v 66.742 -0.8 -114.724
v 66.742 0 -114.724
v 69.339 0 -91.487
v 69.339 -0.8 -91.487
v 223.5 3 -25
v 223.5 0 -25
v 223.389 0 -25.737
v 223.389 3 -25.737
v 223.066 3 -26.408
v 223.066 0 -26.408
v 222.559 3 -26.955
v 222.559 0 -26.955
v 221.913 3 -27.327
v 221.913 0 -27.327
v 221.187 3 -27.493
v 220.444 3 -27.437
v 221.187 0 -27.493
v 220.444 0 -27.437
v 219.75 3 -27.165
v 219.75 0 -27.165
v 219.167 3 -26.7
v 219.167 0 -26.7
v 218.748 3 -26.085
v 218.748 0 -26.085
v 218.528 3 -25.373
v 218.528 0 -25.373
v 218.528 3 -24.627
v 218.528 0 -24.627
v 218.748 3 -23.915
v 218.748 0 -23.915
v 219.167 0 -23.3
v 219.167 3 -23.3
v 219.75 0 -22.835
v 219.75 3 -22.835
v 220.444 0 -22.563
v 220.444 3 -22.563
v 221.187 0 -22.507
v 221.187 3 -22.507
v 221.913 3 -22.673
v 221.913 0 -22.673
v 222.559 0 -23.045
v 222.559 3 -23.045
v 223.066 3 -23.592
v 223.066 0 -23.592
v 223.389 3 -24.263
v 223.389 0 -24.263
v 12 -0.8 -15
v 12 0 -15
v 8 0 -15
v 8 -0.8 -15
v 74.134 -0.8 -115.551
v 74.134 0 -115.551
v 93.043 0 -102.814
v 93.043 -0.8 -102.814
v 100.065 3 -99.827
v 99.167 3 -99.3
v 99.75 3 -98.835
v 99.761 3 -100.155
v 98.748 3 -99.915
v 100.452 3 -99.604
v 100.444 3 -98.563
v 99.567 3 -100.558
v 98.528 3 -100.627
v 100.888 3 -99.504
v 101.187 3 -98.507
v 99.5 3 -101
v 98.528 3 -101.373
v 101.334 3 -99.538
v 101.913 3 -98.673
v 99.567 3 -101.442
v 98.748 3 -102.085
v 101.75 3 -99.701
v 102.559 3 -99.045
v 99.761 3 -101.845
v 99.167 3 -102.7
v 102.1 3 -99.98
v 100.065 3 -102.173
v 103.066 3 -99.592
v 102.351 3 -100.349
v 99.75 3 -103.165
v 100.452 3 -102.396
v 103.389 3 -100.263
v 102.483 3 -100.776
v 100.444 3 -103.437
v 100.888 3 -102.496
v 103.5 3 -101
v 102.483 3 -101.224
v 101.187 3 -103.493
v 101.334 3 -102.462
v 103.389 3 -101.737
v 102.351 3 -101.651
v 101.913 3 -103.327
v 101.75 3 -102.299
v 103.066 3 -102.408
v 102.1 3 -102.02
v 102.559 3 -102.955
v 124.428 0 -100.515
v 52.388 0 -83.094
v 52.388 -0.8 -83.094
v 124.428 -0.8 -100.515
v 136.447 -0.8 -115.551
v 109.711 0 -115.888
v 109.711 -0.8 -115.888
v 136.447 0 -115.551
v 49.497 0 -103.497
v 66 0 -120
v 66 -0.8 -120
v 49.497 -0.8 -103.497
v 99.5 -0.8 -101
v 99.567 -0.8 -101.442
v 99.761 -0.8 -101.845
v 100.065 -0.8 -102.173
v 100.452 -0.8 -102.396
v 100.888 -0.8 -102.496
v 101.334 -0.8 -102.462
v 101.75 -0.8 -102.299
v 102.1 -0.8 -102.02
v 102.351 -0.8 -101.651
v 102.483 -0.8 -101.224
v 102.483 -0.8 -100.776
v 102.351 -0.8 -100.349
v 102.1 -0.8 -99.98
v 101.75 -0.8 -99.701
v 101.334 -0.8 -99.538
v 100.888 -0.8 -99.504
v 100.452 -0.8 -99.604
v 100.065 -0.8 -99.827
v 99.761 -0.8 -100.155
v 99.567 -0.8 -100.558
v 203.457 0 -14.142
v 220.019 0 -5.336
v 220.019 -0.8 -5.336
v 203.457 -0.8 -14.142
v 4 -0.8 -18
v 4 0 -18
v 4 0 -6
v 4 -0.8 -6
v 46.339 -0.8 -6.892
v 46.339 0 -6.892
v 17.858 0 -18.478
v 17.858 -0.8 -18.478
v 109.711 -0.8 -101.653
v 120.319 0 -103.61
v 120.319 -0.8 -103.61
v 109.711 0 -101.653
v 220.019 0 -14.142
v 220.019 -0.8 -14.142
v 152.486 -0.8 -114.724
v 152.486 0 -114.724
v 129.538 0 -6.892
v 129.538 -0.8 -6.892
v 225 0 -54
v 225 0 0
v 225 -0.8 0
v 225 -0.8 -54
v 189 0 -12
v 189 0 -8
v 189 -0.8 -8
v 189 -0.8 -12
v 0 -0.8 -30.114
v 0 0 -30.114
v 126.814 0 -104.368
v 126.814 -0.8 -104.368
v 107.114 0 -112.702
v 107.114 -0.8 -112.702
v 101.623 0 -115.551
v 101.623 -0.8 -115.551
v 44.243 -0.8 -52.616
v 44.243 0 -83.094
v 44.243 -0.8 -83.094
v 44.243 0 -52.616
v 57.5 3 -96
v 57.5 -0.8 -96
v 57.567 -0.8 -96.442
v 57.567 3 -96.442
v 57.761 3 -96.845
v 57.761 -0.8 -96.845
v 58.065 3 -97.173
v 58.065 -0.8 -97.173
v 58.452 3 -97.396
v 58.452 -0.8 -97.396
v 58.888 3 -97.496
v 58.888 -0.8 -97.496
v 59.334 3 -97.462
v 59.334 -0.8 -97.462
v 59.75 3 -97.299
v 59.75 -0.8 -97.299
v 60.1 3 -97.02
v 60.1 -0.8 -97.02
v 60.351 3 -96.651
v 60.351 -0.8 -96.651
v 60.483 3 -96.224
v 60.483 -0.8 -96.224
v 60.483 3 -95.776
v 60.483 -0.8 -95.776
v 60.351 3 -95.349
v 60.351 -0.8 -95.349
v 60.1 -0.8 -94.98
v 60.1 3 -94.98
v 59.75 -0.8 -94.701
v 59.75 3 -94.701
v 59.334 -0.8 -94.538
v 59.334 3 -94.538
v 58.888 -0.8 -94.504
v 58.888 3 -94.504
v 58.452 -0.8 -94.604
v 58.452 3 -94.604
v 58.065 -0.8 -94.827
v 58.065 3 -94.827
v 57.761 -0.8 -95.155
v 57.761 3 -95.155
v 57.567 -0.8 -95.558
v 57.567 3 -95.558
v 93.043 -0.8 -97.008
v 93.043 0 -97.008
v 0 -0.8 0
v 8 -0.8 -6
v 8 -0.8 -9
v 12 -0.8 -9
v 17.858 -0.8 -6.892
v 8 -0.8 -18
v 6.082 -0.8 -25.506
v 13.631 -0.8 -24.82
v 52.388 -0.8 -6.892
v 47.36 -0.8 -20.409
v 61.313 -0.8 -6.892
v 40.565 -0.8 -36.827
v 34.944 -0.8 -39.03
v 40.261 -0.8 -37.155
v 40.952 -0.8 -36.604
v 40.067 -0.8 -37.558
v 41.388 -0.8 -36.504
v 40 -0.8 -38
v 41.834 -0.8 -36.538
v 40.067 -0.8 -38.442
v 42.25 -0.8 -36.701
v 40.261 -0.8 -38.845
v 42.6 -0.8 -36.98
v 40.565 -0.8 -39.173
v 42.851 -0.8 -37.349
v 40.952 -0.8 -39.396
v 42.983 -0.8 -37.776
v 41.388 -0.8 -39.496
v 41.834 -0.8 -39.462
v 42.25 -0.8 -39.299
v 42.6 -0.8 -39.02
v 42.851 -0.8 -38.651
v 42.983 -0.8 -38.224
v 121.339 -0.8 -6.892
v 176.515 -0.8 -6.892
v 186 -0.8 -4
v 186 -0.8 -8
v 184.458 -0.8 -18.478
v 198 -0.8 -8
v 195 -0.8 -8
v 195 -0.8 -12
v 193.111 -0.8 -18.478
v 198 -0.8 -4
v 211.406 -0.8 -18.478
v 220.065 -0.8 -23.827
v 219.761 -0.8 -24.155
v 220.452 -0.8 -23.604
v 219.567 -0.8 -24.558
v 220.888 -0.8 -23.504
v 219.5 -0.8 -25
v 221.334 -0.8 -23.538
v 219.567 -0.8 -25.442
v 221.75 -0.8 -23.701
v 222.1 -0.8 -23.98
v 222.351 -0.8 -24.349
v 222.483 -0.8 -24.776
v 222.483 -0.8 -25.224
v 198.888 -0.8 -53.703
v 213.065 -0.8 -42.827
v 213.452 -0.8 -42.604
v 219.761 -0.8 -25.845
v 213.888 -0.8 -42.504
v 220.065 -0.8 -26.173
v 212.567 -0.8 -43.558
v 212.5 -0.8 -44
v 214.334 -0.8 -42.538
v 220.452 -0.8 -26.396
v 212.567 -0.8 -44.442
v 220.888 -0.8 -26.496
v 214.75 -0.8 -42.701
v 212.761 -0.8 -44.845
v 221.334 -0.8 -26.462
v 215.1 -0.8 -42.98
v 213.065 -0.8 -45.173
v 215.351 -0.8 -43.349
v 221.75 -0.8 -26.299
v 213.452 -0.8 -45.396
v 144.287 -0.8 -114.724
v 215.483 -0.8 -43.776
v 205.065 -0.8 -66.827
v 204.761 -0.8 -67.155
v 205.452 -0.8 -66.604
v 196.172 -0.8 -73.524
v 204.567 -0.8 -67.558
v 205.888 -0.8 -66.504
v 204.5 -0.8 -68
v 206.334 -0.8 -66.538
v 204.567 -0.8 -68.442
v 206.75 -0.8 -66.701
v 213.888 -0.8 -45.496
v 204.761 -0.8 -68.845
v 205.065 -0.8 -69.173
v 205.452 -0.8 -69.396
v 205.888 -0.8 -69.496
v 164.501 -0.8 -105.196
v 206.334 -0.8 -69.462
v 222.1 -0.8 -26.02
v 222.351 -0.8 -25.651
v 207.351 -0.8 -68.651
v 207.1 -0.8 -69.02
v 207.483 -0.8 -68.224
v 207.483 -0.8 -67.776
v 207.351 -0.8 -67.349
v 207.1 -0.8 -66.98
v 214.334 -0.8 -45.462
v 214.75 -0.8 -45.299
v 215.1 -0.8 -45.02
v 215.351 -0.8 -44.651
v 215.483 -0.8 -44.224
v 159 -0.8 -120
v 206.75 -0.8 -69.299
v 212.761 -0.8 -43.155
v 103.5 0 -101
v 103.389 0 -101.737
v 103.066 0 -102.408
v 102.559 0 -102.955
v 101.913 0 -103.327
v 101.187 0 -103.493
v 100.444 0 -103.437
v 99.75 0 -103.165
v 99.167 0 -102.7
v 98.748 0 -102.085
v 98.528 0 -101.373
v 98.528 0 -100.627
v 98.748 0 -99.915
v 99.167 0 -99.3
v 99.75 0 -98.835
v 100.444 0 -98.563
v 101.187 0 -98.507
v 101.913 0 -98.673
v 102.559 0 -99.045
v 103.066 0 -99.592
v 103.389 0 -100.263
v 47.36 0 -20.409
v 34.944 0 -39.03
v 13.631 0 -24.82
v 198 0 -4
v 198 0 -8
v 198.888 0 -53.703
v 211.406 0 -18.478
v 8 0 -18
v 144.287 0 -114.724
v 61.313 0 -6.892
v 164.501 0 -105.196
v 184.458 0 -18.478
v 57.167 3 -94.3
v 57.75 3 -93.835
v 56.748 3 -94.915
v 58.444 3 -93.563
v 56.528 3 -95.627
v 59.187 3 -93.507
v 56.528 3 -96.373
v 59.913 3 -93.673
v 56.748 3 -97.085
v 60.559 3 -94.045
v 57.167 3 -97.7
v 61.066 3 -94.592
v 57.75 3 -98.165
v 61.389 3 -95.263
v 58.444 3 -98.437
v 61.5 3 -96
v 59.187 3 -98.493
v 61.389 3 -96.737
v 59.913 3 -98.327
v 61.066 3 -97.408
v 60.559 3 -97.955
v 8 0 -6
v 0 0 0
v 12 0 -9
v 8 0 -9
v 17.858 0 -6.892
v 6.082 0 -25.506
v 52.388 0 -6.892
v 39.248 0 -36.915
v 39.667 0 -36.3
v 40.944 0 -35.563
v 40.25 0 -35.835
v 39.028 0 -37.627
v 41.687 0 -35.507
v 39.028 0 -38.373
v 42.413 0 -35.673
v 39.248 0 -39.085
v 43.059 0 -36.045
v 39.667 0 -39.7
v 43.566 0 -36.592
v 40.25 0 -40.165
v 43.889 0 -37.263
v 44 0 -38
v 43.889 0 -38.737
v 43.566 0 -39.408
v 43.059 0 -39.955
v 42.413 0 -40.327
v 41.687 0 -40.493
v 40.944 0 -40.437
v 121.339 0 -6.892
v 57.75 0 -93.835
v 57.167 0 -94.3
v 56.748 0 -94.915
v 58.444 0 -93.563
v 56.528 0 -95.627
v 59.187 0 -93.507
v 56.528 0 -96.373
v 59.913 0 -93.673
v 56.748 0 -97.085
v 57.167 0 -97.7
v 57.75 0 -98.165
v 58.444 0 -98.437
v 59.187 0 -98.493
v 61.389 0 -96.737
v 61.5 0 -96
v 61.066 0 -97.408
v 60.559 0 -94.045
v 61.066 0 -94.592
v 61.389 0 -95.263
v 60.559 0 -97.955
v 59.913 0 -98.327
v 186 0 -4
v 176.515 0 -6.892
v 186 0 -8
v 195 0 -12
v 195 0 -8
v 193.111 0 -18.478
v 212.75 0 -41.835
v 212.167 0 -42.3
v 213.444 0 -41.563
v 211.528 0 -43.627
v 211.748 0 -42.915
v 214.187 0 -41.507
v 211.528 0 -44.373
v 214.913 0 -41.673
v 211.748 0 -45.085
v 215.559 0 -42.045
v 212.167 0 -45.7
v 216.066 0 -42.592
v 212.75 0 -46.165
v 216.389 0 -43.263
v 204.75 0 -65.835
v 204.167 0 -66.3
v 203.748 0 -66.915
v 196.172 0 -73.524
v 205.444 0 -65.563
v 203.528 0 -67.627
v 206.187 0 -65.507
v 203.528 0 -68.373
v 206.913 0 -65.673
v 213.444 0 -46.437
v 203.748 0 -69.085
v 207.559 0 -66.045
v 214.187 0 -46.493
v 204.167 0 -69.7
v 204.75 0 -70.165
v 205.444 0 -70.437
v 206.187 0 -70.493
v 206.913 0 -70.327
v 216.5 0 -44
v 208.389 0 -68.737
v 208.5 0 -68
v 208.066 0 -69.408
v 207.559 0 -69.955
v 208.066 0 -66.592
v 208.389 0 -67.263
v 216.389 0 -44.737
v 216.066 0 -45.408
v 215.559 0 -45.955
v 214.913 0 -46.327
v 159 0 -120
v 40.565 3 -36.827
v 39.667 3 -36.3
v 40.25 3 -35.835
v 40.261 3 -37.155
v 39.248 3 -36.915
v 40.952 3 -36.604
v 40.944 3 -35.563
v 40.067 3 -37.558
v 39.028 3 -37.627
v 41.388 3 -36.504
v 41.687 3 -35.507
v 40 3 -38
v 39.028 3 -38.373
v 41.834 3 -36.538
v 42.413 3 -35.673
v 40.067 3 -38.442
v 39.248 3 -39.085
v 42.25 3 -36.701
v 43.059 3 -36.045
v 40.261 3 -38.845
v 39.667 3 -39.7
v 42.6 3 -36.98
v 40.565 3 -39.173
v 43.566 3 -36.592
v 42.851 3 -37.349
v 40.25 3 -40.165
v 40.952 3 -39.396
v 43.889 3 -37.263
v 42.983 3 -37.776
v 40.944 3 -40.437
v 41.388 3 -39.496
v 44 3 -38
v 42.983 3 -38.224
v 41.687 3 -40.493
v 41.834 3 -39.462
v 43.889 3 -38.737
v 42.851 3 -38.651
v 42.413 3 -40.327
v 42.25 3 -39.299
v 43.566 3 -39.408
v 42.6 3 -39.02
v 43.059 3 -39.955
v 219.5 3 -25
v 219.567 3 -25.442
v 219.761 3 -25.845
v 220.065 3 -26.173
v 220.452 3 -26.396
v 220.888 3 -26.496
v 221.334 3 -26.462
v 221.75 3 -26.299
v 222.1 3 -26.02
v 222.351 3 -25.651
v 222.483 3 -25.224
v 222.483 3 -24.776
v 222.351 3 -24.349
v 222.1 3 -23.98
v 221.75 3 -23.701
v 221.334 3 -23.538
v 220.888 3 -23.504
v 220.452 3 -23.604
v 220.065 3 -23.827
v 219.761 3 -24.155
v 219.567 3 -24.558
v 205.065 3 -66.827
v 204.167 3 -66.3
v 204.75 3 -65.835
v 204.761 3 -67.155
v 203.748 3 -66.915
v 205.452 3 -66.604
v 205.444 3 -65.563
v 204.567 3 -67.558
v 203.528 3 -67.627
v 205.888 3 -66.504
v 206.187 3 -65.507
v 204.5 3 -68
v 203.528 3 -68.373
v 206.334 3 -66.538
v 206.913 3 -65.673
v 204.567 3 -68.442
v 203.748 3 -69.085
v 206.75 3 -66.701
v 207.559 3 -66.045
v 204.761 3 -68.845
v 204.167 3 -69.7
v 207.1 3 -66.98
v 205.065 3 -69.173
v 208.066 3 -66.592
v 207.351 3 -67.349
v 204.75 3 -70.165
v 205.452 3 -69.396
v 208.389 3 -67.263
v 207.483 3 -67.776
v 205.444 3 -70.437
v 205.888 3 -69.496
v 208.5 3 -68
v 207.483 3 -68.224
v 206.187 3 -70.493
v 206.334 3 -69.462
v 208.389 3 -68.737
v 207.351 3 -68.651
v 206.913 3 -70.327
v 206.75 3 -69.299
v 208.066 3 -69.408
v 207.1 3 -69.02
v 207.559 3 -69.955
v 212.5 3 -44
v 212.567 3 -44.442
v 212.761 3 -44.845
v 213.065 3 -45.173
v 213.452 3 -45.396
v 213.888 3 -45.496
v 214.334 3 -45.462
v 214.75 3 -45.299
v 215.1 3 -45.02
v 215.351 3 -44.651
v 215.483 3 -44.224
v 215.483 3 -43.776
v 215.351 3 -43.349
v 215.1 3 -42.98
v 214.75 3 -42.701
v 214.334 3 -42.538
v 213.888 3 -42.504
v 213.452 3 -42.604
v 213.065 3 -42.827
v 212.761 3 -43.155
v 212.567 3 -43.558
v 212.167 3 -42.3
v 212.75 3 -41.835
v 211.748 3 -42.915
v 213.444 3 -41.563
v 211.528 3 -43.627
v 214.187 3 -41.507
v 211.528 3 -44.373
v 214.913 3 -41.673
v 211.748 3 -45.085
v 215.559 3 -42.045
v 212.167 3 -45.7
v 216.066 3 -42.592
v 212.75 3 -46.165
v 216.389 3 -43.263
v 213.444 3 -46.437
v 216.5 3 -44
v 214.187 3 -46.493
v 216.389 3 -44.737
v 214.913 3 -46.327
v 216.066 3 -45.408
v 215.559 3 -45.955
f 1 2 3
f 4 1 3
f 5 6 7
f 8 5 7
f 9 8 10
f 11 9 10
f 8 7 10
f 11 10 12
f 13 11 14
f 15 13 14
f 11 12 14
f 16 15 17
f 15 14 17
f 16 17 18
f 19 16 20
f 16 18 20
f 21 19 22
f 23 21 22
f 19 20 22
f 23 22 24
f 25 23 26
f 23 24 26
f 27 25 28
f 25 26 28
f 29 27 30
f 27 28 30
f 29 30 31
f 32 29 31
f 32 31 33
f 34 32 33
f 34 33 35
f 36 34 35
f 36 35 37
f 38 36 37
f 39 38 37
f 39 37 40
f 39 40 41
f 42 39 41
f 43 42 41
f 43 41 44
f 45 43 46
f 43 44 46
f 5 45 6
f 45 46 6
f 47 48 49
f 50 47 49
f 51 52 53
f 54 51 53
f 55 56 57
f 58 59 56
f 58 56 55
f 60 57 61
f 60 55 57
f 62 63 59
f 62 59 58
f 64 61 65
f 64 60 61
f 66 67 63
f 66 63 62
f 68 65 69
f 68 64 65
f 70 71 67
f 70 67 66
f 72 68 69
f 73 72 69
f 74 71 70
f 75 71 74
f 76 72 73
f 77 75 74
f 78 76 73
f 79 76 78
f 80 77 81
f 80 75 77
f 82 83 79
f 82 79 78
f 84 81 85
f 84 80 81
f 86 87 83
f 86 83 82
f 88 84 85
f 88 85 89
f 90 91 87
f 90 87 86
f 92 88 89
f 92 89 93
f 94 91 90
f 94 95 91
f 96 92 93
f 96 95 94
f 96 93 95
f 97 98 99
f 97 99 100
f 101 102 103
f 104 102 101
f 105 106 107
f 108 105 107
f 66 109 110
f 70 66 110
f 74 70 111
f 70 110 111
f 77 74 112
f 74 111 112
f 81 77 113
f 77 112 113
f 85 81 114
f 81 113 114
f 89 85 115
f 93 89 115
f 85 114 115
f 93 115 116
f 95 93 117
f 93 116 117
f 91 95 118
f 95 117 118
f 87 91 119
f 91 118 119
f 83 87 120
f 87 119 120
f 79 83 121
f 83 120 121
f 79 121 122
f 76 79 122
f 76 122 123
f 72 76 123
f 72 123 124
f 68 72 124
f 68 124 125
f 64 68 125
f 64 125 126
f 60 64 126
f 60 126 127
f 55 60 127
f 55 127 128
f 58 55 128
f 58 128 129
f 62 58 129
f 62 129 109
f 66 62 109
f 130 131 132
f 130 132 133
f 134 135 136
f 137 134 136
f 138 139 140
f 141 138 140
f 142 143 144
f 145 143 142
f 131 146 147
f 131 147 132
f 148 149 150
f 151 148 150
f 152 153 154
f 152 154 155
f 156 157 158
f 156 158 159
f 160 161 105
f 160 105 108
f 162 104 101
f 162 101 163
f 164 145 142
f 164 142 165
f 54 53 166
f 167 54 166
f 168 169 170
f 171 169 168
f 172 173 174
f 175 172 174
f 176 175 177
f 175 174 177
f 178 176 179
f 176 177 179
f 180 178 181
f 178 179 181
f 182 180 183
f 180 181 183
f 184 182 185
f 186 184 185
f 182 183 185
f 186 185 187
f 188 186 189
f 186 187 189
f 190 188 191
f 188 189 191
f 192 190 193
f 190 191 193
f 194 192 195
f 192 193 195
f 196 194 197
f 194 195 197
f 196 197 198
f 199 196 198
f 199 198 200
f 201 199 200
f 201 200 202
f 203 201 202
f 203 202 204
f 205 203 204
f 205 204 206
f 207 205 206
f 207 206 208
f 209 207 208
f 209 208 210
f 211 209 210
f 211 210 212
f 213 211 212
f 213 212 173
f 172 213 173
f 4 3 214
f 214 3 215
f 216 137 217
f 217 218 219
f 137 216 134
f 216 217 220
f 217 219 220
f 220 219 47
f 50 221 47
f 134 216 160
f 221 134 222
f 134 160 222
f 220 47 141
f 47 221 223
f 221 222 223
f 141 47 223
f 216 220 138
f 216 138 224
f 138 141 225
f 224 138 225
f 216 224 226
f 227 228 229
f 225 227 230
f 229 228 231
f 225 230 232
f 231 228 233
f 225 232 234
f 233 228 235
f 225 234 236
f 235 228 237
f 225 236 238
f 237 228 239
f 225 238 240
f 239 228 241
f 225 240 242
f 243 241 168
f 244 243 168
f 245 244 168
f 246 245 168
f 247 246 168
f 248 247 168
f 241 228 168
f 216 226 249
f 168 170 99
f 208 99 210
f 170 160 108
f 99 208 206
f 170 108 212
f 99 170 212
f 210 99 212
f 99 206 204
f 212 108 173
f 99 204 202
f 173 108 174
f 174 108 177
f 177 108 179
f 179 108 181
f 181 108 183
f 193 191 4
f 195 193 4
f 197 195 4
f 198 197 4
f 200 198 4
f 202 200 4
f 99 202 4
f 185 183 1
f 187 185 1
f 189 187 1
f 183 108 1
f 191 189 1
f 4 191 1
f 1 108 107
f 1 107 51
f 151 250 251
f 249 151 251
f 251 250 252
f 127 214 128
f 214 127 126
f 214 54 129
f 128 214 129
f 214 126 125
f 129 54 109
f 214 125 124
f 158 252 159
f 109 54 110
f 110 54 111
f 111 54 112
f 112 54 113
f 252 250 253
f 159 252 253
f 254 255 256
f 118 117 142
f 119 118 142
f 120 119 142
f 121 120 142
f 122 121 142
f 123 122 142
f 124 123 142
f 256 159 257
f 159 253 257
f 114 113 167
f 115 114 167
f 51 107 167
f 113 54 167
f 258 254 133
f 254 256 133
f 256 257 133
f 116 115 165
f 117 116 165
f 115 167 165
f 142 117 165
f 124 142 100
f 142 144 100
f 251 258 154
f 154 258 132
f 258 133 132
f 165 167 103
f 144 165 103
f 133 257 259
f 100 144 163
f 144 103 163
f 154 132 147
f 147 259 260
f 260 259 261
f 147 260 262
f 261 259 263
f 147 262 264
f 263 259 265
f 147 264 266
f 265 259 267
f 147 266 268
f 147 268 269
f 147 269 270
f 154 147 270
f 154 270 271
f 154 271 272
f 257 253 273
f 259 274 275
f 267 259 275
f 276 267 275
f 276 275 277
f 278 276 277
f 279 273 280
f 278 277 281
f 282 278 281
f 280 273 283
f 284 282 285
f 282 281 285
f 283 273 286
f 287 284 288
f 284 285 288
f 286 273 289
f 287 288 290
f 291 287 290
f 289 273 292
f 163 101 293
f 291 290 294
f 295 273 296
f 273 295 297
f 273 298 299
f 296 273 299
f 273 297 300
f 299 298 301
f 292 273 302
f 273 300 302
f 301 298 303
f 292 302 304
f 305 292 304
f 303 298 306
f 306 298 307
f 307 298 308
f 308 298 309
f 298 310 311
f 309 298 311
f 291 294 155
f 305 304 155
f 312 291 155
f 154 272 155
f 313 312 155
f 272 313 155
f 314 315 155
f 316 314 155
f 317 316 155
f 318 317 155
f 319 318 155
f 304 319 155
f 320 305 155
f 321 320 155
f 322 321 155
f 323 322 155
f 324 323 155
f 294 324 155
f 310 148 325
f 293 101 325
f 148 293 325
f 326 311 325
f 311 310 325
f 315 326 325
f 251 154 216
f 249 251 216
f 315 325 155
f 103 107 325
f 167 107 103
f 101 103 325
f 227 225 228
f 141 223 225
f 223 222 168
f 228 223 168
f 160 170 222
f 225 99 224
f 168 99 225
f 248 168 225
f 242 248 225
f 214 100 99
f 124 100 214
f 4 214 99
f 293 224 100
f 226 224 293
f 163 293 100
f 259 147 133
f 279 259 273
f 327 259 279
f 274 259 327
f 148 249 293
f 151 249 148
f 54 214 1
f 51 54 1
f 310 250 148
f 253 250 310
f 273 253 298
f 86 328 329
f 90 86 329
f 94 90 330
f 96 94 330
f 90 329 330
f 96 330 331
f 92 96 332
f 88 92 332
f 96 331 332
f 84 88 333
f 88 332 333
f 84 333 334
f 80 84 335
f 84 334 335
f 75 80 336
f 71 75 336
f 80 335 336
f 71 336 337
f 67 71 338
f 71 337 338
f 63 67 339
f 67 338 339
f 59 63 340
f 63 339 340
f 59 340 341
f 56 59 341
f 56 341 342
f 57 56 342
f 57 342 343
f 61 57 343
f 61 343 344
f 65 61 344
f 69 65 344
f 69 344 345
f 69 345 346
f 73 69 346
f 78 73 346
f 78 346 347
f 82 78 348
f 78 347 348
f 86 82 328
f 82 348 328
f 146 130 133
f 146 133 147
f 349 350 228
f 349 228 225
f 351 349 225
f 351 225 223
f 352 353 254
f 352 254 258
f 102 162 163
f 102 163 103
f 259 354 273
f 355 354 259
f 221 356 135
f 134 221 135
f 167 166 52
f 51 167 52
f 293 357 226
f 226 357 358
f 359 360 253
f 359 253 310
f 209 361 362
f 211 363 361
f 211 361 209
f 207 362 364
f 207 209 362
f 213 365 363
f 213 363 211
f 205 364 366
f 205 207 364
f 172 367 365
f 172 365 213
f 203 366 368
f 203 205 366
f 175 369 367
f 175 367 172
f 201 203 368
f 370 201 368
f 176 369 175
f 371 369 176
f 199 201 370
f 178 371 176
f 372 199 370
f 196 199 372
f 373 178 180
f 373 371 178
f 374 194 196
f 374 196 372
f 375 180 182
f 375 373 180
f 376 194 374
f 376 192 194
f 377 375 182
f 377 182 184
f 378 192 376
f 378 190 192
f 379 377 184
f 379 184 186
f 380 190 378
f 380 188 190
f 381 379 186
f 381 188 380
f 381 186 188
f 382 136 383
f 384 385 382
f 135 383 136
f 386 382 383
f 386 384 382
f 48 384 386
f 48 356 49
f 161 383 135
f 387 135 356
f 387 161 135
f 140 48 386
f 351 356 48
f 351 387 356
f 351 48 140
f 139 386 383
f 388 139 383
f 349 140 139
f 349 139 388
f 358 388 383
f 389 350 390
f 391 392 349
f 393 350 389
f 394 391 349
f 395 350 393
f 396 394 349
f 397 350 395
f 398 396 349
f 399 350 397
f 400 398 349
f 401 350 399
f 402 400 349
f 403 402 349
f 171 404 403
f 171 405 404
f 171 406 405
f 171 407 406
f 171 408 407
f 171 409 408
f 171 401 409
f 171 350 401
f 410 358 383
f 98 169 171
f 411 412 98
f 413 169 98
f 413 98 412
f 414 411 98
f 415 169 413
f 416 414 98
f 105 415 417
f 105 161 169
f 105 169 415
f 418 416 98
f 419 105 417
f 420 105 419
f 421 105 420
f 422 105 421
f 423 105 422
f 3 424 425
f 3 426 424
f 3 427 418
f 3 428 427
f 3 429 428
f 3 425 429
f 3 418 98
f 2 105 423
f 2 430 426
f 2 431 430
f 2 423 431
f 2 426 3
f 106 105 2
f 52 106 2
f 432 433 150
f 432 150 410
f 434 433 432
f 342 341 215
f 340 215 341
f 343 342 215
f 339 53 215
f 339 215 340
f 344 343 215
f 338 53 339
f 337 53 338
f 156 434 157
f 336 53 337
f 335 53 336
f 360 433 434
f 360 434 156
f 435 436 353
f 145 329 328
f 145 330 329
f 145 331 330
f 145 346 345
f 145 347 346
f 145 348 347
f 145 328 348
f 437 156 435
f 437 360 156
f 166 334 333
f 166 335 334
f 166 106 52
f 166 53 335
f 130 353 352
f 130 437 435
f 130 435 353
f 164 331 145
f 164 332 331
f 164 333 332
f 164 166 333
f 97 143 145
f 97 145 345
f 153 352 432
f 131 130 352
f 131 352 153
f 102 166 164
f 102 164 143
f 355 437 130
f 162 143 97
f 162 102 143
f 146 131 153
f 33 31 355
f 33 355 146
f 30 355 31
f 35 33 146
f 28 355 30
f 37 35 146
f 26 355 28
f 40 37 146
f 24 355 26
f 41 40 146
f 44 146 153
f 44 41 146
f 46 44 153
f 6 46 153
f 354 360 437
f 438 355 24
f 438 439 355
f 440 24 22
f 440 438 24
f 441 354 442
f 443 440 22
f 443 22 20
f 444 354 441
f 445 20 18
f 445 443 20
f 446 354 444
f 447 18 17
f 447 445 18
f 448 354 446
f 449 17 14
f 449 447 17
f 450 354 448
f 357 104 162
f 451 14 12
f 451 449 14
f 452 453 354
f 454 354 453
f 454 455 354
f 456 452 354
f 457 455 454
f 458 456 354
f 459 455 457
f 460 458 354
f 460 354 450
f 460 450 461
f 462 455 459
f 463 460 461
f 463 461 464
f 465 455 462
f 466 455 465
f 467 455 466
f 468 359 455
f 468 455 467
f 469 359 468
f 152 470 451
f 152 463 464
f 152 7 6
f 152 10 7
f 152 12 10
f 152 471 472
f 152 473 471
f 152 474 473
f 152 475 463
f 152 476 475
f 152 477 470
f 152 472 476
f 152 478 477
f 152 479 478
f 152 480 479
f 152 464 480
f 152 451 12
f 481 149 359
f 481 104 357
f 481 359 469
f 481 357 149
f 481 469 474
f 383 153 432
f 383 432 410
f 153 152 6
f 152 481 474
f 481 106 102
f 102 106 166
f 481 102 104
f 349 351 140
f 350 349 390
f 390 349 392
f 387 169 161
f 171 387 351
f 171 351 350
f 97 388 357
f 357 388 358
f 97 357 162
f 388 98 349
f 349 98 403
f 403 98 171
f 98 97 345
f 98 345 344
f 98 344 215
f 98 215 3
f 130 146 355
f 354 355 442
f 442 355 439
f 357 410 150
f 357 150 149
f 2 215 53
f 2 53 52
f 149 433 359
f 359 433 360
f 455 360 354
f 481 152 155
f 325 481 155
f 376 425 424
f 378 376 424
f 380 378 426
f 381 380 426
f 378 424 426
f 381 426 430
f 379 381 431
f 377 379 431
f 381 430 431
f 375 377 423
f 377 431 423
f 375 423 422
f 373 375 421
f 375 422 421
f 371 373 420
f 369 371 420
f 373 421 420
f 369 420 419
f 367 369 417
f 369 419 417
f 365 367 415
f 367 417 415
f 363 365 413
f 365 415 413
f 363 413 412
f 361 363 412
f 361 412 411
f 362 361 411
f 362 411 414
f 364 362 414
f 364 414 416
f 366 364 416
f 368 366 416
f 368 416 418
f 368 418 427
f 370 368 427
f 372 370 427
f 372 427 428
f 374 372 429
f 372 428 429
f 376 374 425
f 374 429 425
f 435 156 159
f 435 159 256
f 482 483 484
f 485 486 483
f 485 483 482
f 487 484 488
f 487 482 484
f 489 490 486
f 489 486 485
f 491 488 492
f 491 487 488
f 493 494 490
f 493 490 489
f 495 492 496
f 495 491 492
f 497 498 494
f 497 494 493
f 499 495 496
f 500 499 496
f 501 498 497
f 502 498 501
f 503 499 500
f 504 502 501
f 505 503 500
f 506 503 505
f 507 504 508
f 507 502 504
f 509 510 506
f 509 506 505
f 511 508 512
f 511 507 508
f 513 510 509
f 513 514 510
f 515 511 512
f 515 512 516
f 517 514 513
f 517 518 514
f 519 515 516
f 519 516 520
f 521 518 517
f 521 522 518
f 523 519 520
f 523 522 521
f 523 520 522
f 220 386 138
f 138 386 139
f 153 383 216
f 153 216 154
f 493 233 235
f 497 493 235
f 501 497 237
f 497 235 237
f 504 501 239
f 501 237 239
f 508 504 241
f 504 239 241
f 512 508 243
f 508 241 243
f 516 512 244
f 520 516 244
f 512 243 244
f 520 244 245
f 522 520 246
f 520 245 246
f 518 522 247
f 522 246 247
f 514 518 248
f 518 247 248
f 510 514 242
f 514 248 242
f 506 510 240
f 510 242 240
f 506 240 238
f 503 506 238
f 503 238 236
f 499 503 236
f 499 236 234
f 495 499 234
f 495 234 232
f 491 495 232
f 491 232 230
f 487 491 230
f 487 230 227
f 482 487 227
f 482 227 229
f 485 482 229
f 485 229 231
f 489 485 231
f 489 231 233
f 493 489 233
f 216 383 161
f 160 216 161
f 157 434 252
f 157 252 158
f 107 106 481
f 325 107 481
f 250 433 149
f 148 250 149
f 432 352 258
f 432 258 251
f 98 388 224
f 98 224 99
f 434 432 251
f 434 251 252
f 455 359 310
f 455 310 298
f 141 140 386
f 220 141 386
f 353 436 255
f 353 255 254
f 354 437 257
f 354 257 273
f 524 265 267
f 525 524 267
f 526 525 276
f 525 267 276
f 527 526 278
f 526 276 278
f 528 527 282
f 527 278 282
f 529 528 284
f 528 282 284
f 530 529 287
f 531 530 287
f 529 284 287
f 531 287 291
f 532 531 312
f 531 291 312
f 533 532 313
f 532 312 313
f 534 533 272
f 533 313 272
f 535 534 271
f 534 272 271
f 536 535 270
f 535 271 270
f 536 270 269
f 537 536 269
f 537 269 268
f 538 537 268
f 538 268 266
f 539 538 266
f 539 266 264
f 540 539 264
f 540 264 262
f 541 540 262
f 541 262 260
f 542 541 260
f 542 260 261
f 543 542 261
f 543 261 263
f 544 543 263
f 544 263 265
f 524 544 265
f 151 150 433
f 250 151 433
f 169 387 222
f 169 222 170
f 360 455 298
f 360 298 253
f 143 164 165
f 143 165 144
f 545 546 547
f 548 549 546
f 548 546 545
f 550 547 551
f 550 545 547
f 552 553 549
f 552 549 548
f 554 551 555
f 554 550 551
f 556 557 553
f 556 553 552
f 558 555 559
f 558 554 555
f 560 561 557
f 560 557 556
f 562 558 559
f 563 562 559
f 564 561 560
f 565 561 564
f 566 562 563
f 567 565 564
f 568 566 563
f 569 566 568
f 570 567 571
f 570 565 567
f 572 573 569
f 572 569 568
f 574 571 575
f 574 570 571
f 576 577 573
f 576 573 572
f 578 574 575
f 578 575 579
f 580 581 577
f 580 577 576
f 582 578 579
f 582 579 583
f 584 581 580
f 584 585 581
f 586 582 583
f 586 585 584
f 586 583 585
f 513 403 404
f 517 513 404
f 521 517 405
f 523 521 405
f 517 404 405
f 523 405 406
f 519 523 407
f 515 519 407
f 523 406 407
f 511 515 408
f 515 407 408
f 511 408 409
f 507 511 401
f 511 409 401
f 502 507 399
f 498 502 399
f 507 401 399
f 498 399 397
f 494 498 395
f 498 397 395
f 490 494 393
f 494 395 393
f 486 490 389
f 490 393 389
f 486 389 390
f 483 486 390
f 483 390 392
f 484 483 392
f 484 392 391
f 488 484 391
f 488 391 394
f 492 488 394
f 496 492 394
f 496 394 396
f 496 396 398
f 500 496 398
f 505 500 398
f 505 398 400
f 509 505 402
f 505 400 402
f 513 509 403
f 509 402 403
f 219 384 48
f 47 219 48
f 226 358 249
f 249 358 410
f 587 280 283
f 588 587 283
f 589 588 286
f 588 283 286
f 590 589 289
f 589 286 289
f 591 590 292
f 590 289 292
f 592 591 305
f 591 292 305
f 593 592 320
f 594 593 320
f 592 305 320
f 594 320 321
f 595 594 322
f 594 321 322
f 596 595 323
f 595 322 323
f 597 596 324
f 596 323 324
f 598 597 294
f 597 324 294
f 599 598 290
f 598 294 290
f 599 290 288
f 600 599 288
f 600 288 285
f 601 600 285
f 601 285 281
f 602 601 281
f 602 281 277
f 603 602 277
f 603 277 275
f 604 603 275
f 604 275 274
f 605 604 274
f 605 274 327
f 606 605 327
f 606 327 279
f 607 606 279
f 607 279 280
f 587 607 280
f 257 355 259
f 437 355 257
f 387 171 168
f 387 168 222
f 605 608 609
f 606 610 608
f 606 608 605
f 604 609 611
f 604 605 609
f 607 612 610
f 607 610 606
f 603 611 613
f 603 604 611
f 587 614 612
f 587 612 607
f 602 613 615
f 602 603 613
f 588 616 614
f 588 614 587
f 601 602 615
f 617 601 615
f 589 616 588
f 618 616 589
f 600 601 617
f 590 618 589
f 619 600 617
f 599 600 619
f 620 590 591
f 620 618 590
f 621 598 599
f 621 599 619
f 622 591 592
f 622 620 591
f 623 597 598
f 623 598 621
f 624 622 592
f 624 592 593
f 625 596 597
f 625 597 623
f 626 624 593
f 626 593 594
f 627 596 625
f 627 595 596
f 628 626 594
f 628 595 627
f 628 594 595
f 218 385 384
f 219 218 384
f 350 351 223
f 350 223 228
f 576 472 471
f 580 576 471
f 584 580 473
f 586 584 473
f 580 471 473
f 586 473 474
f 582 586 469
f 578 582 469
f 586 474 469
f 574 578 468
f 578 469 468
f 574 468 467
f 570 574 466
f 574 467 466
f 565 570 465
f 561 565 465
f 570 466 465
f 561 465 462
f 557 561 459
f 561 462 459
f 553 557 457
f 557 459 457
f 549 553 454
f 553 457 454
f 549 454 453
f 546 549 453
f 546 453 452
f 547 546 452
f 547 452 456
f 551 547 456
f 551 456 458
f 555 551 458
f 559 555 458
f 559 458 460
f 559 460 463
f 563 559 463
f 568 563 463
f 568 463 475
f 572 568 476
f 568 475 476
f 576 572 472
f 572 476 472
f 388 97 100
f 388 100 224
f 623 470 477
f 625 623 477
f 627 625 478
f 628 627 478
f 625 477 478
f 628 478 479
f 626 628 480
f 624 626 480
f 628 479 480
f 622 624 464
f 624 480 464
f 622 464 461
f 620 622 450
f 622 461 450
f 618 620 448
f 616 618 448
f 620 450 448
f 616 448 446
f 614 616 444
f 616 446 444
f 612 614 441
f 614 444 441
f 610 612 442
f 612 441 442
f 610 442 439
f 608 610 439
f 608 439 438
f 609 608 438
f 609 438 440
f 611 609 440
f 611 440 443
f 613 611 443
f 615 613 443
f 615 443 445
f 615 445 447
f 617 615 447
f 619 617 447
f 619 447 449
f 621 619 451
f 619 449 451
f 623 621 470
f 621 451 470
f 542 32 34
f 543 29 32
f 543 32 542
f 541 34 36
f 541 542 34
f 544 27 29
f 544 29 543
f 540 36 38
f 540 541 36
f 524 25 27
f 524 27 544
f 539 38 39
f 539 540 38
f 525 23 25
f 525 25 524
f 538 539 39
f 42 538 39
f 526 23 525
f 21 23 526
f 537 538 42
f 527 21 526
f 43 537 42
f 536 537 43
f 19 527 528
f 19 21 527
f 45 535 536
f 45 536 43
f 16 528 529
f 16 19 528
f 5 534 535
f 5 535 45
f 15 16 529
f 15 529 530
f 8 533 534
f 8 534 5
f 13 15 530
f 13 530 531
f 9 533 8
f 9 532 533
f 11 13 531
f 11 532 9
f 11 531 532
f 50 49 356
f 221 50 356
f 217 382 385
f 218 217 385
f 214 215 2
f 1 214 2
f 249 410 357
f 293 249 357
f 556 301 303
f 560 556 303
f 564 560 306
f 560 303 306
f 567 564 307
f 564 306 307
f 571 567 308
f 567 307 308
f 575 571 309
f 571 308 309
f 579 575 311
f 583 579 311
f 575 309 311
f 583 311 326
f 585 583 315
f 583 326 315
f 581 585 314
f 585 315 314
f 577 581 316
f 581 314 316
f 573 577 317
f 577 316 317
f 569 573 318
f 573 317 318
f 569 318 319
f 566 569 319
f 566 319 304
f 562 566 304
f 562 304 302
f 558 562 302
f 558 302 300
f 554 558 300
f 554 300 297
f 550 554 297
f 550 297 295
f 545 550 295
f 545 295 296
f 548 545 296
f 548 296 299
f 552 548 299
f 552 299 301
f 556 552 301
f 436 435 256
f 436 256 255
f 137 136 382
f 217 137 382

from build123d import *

# Parameters (mm, degrees)
SKETCH2_R                 = 2.5
BOSS_EXTRUDE1_DEPTH       = 3
BOSS_EXTRUDE1_2_DEPTH     = 3
BOSS_EXTRUDE1_3_DEPTH     = 3
BOSS_EXTRUDE1_4_DEPTH     = 3
BOSS_EXTRUDE1_5_DEPTH     = 3
BOSS_EXTRUDE1_6_DEPTH     = 3
SKETCH4_W                 = 225
SKETCH4_H                 = 120
BOSS_EXTRUDE2_DEPTH       = 0.8
F_3_0MM_DOWEL_HOLE1_D     = 3
F_3_0MM_DOWEL_HOLE1_DEPTH = 4
CUT_EXTRUDE1_REACH        = 2.8
CHAMFER1_SIZE             = 66
CUT_EXTRUDE2_REACH        = 2.8
CHAMFER3_SIZE             = 70
CHAMFER3_SIZE2            = 23.885549322


with BuildPart() as part:
    # Sketch2 → Boss-Extrude1 (new body)
    with BuildSketch(Plane(origin=(0, 0, 0), x_dir=(1, 0, 0), z_dir=(0, 1, 0))):
        with Locations((101, 101)):
            Circle(SKETCH2_R)
    extrude(amount=BOSS_EXTRUDE1_DEPTH)



with BuildPart() as body_2:
    # Sketch2 → Boss-Extrude1 2 (new body)
    with BuildSketch(Plane(origin=(0, 0, 0), x_dir=(1, 0, 0), z_dir=(0, 1, 0))):
        with Locations((206, 68)):
            Circle(SKETCH2_R)
    extrude(amount=BOSS_EXTRUDE1_2_DEPTH)


with BuildPart() as body_3:
    # Sketch2 → Boss-Extrude1 3 (new body)
    with BuildSketch(Plane(origin=(0, 0, 0), x_dir=(1, 0, 0), z_dir=(0, 1, 0))):
        with Locations((214, 44)):
            Circle(SKETCH2_R)
    extrude(amount=BOSS_EXTRUDE1_3_DEPTH)


with BuildPart() as body_4:
    # Sketch2 → Boss-Extrude1 4 (new body)
    with BuildSketch(Plane(origin=(0, 0, 0), x_dir=(1, 0, 0), z_dir=(0, 1, 0))):
        with Locations((221, 25)):
            Circle(SKETCH2_R)
    extrude(amount=BOSS_EXTRUDE1_4_DEPTH)


with BuildPart() as body_5:
    # Sketch2 → Boss-Extrude1 5 (new body)
    with BuildSketch(Plane(origin=(0, 0, 0), x_dir=(1, 0, 0), z_dir=(0, 1, 0))):
        with Locations((41.5, 38)):
            Circle(SKETCH2_R)
    extrude(amount=BOSS_EXTRUDE1_5_DEPTH)


with BuildPart() as body_6:
    # Sketch2 → Boss-Extrude1 6 (new body)
    with BuildSketch(Plane(origin=(0, 0, 0), x_dir=(1, 0, 0), z_dir=(0, 1, 0))):
        with Locations((59, 96)):
            Circle(SKETCH2_R)
    extrude(amount=BOSS_EXTRUDE1_6_DEPTH)


with BuildPart() as part_1:
    add(part.part)

    add(body_2.part)  # Boss-Extrude2 merges body 2

    add(body_3.part)  # Boss-Extrude2 merges body 3

    add(body_4.part)  # Boss-Extrude2 merges body 4

    add(body_5.part)  # Boss-Extrude2 merges body 5

    add(body_6.part)  # Boss-Extrude2 merges body 6
    # Sketch4 → Boss-Extrude2 (add)
    with BuildSketch(Plane(origin=(0, 0, 0), x_dir=(1, 0, 0), z_dir=(0, 1, 0))):
        with Locations((112.5, 60)):
            Rectangle(SKETCH4_W, SKETCH4_H)
    extrude(amount=-BOSS_EXTRUDE2_DEPTH)

    # Ø3.0mm Dowel Hole1
    with Locations(Plane(origin=(0, 3, 0), x_dir=(1, 0, 0), z_dir=(0, 1, 0))):
        with Locations((59, 96), (101, 101), (206, 68), (214, 44), (221, 25), (41.5, 38)):
            Hole(F_3_0MM_DOWEL_HOLE1_D / 2, depth=F_3_0MM_DOWEL_HOLE1_DEPTH)

    # Sketch27 → Cut-Extrude1 (cut, up to next)
    with BuildSketch(Plane(origin=(0, 0, 0), x_dir=(1, 0, 0), z_dir=(0, 1, 0)), mode=Mode.PRIVATE) as cut_extrude1_sk1:
        Polygon((186, 8), (189, 8), (189, 12), (195, 12), (195, 8), (198, 8), (198, 4), (186, 4), align=None)
    cut_extrude1_tool1 = extrude(cut_extrude1_sk1.sketch, amount=-CUT_EXTRUDE1_REACH, mode=Mode.PRIVATE) & part_1.part
    add(cut_extrude1_tool1.solids().sort_by_distance((192, 0, -7.333333))[0], mode=Mode.SUBTRACT)
    # Sketch27 → Cut-Extrude1 (cut, up to next)
    with BuildSketch(Plane(origin=(0, 0, 0), x_dir=(1, 0, 0), z_dir=(0, 1, 0)), mode=Mode.PRIVATE) as cut_extrude1_sk2:
        Polygon((4, 6), (8, 6), (8, 9), (12, 9), (12, 15), (8, 15), (8, 18), (4, 18), align=None)
    cut_extrude1_tool2 = extrude(cut_extrude1_sk2.sketch, amount=-CUT_EXTRUDE1_REACH, mode=Mode.PRIVATE) & part_1.part
    add(cut_extrude1_tool2.solids().sort_by_distance((7.333333, 0, -12))[0], mode=Mode.SUBTRACT)

    # Chamfer1
    chamfer1_edges = [part_1.edges().sort_by_distance(p)[0] for p in [
        (0, -0.4, -120),
        (225, -0.4, -120),
    ]]
    chamfer(chamfer1_edges, length=CHAMFER1_SIZE)

    # Sketch28 → Cut-Extrude2 (cut, up to next)
    with BuildSketch(Plane(origin=(0, 0, 0), x_dir=(1, 0, 0), z_dir=(0, 1, 0)), mode=Mode.PRIVATE) as cut_extrude2_sk1:
        Polygon((52.388319297, 6.891877983), (52.388319297, 83.093591857), (124.427979621, 100.514856146), align=None)
    cut_extrude2_tool1 = extrude(cut_extrude2_sk1.sketch, amount=-CUT_EXTRUDE2_REACH, mode=Mode.PRIVATE) & part_1.part
    add(cut_extrude2_tool1.solids().sort_by_distance((76.401539, 0, -63.500109))[0], mode=Mode.SUBTRACT)
    # Sketch28 → Cut-Extrude2 (cut, up to next)
    with BuildSketch(Plane(origin=(0, 0, 0), x_dir=(1, 0, 0), z_dir=(0, 1, 0)), mode=Mode.PRIVATE) as cut_extrude2_sk2:
        Polygon((144.286671327, 114.724380441), (61.313270979, 6.891877983), (121.338711512, 6.891877983), align=None)
    cut_extrude2_tool2 = extrude(cut_extrude2_sk2.sketch, amount=-CUT_EXTRUDE2_REACH, mode=Mode.PRIVATE) & part_1.part
    add(cut_extrude2_tool2.solids().sort_by_distance((108.979551, 0, -42.836045))[0], mode=Mode.SUBTRACT)
    # Sketch28 → Cut-Extrude2 (cut, up to next)
    with BuildSketch(Plane(origin=(0, 0, 0), x_dir=(1, 0, 0), z_dir=(0, 1, 0)), mode=Mode.PRIVATE) as cut_extrude2_sk3:
        Polygon((152.485832321, 114.724380441), (129.537872506, 6.891877983), (176.515283586, 6.891877983), align=None)
    cut_extrude2_tool3 = extrude(cut_extrude2_sk3.sketch, amount=-CUT_EXTRUDE2_REACH, mode=Mode.PRIVATE) & part_1.part
    add(cut_extrude2_tool3.solids().sort_by_distance((152.846329, 0, -42.836045))[0], mode=Mode.SUBTRACT)
    # Sketch28 → Cut-Extrude2 (cut, up to next)
    with BuildSketch(Plane(origin=(0, 0, 0), x_dir=(1, 0, 0), z_dir=(0, 1, 0)), mode=Mode.PRIVATE) as cut_extrude2_sk4:
        Polygon((164.500557953, 105.19569086), (196.171947419, 73.524301395), (184.457582932, 18.478482617), align=None)
    cut_extrude2_tool4 = extrude(cut_extrude2_sk4.sketch, amount=-CUT_EXTRUDE2_REACH, mode=Mode.PRIVATE) & part_1.part
    add(cut_extrude2_tool4.solids().sort_by_distance((181.710029, 0, -65.732825))[0], mode=Mode.SUBTRACT)
    # Sketch28 → Cut-Extrude2 (cut, up to next)
    with BuildSketch(Plane(origin=(0, 0, 0), x_dir=(1, 0, 0), z_dir=(0, 1, 0)), mode=Mode.PRIVATE) as cut_extrude2_sk5:
        Polygon((198.888278472, 53.703367065), (211.405882256, 18.478482617), (193.110922879, 18.478482617), align=None)
    cut_extrude2_tool5 = extrude(cut_extrude2_sk5.sketch, amount=-CUT_EXTRUDE2_REACH, mode=Mode.PRIVATE) & part_1.part
    add(cut_extrude2_tool5.solids().sort_by_distance((201.135028, 0, -30.220111))[0], mode=Mode.SUBTRACT)
    # Sketch28 → Cut-Extrude2 (cut, up to next)
    with BuildSketch(Plane(origin=(0, 0, 0), x_dir=(1, 0, 0), z_dir=(0, 1, 0)), mode=Mode.PRIVATE) as cut_extrude2_sk6:
        Polygon((44.242680865, 83.093591857), (44.242680865, 52.616095827), (6.082421341, 25.506148765), align=None)
    cut_extrude2_tool6 = extrude(cut_extrude2_sk6.sketch, amount=-CUT_EXTRUDE2_REACH, mode=Mode.PRIVATE) & part_1.part
    add(cut_extrude2_tool6.solids().sort_by_distance((31.522594, 0, -53.738612))[0], mode=Mode.SUBTRACT)
    # Sketch28 → Cut-Extrude2 (cut, up to next)
    with BuildSketch(Plane(origin=(0, 0, 0), x_dir=(1, 0, 0), z_dir=(0, 1, 0)), mode=Mode.PRIVATE) as cut_extrude2_sk7:
        Polygon((13.630560586, 24.81954669), (34.944244067, 39.030171699), (47.359604213, 20.409100754), align=None)
    cut_extrude2_tool7 = extrude(cut_extrude2_sk7.sketch, amount=-CUT_EXTRUDE2_REACH, mode=Mode.PRIVATE) & part_1.part
    add(cut_extrude2_tool7.solids().sort_by_distance((31.978136, 0, -28.086273))[0], mode=Mode.SUBTRACT)
    # Sketch28 → Cut-Extrude2 (cut, up to next)
    with BuildSketch(Plane(origin=(0, 0, 0), x_dir=(1, 0, 0), z_dir=(0, 1, 0)), mode=Mode.PRIVATE) as cut_extrude2_sk8:
        Polygon((17.858383702, 18.478482617), (17.858383702, 6.891877983), (46.339021234, 6.891877983), align=None)
    cut_extrude2_tool8 = extrude(cut_extrude2_sk8.sketch, amount=-CUT_EXTRUDE2_REACH, mode=Mode.PRIVATE) & part_1.part
    add(cut_extrude2_tool8.solids().sort_by_distance((27.35193, 0, -10.75408))[0], mode=Mode.SUBTRACT)
    # Sketch28 → Cut-Extrude2 (cut, up to next)
    with BuildSketch(Plane(origin=(0, 0, 0), x_dir=(1, 0, 0), z_dir=(0, 1, 0)), mode=Mode.PRIVATE) as cut_extrude2_sk9:
        Polygon((66.741601703, 114.724380441), (69.339310273, 91.487471585), (93.043400976, 97.007602296), align=None)
    cut_extrude2_tool9 = extrude(cut_extrude2_sk9.sketch, amount=-CUT_EXTRUDE2_REACH, mode=Mode.PRIVATE) & part_1.part
    add(cut_extrude2_tool9.solids().sort_by_distance((76.374771, 0, -101.073151))[0], mode=Mode.SUBTRACT)
    # Sketch28 → Cut-Extrude2 (cut, up to next)
    with BuildSketch(Plane(origin=(0, 0, 0), x_dir=(1, 0, 0), z_dir=(0, 1, 0)), mode=Mode.PRIVATE) as cut_extrude2_sk10:
        Polygon((74.134214928, 115.550818021), (93.043400976, 102.813672146), (101.623087305, 115.550818021), align=None)
    cut_extrude2_tool10 = extrude(cut_extrude2_sk10.sketch, amount=-CUT_EXTRUDE2_REACH, mode=Mode.PRIVATE) & part_1.part
    add(cut_extrude2_tool10.solids().sort_by_distance((89.600234, 0, -111.305103))[0], mode=Mode.SUBTRACT)
    # Sketch28 → Cut-Extrude2 (cut, up to next)
    with BuildSketch(Plane(origin=(0, 0, 0), x_dir=(1, 0, 0), z_dir=(0, 1, 0)), mode=Mode.PRIVATE) as cut_extrude2_sk11:
        Polygon((136.446781668, 115.550818021), (126.813612387, 104.367776578), (109.710747348, 115.88819244), align=None)
    cut_extrude2_tool11 = extrude(cut_extrude2_sk11.sketch, amount=-CUT_EXTRUDE2_REACH, mode=Mode.PRIVATE) & part_1.part
    add(cut_extrude2_tool11.solids().sort_by_distance((124.323714, 0, -111.935596))[0], mode=Mode.SUBTRACT)
    # Sketch28 → Cut-Extrude2 (cut, up to next)
    with BuildSketch(Plane(origin=(0, 0, 0), x_dir=(1, 0, 0), z_dir=(0, 1, 0)), mode=Mode.PRIVATE) as cut_extrude2_sk12:
        Polygon((107.114322397, 112.702091574), (120.319340962, 103.610111579), (109.710747348, 101.653186543), align=None)
    cut_extrude2_tool12 = extrude(cut_extrude2_sk12.sketch, amount=-CUT_EXTRUDE2_REACH, mode=Mode.PRIVATE) & part_1.part
    add(cut_extrude2_tool12.solids().sort_by_distance((112.38147, 0, -105.988463))[0], mode=Mode.SUBTRACT)
    # Sketch28 → Cut-Extrude2 (cut, up to next)
    with BuildSketch(Plane(origin=(0, 0, 0), x_dir=(1, 0, 0), z_dir=(0, 1, 0)), mode=Mode.PRIVATE) as cut_extrude2_sk13:
        Polygon((203.456645773, 14.141546381), (220.018577109, 14.141546381), (220.018577109, 5.336468962), align=None)
    cut_extrude2_tool13 = extrude(cut_extrude2_sk13.sketch, amount=-CUT_EXTRUDE2_REACH, mode=Mode.PRIVATE) & part_1.part
    add(cut_extrude2_tool13.solids().sort_by_distance((214.497933, 0, -11.206521))[0], mode=Mode.SUBTRACT)

    # Chamfer3
    chamfer3_edges = [part_1.edges().sort_by_distance(p)[0] for p in [
        (0, -0.4, -54),
    ]]
    chamfer3_side = [part_1.faces().sort_by_distance(p)[0] for p in [
        (33, -0.4, -87),
    ]]
    chamfer(chamfer3_edges, length=CHAMFER3_SIZE, length2=CHAMFER3_SIZE2, reference=chamfer3_side[0])


solid = part_1.part
